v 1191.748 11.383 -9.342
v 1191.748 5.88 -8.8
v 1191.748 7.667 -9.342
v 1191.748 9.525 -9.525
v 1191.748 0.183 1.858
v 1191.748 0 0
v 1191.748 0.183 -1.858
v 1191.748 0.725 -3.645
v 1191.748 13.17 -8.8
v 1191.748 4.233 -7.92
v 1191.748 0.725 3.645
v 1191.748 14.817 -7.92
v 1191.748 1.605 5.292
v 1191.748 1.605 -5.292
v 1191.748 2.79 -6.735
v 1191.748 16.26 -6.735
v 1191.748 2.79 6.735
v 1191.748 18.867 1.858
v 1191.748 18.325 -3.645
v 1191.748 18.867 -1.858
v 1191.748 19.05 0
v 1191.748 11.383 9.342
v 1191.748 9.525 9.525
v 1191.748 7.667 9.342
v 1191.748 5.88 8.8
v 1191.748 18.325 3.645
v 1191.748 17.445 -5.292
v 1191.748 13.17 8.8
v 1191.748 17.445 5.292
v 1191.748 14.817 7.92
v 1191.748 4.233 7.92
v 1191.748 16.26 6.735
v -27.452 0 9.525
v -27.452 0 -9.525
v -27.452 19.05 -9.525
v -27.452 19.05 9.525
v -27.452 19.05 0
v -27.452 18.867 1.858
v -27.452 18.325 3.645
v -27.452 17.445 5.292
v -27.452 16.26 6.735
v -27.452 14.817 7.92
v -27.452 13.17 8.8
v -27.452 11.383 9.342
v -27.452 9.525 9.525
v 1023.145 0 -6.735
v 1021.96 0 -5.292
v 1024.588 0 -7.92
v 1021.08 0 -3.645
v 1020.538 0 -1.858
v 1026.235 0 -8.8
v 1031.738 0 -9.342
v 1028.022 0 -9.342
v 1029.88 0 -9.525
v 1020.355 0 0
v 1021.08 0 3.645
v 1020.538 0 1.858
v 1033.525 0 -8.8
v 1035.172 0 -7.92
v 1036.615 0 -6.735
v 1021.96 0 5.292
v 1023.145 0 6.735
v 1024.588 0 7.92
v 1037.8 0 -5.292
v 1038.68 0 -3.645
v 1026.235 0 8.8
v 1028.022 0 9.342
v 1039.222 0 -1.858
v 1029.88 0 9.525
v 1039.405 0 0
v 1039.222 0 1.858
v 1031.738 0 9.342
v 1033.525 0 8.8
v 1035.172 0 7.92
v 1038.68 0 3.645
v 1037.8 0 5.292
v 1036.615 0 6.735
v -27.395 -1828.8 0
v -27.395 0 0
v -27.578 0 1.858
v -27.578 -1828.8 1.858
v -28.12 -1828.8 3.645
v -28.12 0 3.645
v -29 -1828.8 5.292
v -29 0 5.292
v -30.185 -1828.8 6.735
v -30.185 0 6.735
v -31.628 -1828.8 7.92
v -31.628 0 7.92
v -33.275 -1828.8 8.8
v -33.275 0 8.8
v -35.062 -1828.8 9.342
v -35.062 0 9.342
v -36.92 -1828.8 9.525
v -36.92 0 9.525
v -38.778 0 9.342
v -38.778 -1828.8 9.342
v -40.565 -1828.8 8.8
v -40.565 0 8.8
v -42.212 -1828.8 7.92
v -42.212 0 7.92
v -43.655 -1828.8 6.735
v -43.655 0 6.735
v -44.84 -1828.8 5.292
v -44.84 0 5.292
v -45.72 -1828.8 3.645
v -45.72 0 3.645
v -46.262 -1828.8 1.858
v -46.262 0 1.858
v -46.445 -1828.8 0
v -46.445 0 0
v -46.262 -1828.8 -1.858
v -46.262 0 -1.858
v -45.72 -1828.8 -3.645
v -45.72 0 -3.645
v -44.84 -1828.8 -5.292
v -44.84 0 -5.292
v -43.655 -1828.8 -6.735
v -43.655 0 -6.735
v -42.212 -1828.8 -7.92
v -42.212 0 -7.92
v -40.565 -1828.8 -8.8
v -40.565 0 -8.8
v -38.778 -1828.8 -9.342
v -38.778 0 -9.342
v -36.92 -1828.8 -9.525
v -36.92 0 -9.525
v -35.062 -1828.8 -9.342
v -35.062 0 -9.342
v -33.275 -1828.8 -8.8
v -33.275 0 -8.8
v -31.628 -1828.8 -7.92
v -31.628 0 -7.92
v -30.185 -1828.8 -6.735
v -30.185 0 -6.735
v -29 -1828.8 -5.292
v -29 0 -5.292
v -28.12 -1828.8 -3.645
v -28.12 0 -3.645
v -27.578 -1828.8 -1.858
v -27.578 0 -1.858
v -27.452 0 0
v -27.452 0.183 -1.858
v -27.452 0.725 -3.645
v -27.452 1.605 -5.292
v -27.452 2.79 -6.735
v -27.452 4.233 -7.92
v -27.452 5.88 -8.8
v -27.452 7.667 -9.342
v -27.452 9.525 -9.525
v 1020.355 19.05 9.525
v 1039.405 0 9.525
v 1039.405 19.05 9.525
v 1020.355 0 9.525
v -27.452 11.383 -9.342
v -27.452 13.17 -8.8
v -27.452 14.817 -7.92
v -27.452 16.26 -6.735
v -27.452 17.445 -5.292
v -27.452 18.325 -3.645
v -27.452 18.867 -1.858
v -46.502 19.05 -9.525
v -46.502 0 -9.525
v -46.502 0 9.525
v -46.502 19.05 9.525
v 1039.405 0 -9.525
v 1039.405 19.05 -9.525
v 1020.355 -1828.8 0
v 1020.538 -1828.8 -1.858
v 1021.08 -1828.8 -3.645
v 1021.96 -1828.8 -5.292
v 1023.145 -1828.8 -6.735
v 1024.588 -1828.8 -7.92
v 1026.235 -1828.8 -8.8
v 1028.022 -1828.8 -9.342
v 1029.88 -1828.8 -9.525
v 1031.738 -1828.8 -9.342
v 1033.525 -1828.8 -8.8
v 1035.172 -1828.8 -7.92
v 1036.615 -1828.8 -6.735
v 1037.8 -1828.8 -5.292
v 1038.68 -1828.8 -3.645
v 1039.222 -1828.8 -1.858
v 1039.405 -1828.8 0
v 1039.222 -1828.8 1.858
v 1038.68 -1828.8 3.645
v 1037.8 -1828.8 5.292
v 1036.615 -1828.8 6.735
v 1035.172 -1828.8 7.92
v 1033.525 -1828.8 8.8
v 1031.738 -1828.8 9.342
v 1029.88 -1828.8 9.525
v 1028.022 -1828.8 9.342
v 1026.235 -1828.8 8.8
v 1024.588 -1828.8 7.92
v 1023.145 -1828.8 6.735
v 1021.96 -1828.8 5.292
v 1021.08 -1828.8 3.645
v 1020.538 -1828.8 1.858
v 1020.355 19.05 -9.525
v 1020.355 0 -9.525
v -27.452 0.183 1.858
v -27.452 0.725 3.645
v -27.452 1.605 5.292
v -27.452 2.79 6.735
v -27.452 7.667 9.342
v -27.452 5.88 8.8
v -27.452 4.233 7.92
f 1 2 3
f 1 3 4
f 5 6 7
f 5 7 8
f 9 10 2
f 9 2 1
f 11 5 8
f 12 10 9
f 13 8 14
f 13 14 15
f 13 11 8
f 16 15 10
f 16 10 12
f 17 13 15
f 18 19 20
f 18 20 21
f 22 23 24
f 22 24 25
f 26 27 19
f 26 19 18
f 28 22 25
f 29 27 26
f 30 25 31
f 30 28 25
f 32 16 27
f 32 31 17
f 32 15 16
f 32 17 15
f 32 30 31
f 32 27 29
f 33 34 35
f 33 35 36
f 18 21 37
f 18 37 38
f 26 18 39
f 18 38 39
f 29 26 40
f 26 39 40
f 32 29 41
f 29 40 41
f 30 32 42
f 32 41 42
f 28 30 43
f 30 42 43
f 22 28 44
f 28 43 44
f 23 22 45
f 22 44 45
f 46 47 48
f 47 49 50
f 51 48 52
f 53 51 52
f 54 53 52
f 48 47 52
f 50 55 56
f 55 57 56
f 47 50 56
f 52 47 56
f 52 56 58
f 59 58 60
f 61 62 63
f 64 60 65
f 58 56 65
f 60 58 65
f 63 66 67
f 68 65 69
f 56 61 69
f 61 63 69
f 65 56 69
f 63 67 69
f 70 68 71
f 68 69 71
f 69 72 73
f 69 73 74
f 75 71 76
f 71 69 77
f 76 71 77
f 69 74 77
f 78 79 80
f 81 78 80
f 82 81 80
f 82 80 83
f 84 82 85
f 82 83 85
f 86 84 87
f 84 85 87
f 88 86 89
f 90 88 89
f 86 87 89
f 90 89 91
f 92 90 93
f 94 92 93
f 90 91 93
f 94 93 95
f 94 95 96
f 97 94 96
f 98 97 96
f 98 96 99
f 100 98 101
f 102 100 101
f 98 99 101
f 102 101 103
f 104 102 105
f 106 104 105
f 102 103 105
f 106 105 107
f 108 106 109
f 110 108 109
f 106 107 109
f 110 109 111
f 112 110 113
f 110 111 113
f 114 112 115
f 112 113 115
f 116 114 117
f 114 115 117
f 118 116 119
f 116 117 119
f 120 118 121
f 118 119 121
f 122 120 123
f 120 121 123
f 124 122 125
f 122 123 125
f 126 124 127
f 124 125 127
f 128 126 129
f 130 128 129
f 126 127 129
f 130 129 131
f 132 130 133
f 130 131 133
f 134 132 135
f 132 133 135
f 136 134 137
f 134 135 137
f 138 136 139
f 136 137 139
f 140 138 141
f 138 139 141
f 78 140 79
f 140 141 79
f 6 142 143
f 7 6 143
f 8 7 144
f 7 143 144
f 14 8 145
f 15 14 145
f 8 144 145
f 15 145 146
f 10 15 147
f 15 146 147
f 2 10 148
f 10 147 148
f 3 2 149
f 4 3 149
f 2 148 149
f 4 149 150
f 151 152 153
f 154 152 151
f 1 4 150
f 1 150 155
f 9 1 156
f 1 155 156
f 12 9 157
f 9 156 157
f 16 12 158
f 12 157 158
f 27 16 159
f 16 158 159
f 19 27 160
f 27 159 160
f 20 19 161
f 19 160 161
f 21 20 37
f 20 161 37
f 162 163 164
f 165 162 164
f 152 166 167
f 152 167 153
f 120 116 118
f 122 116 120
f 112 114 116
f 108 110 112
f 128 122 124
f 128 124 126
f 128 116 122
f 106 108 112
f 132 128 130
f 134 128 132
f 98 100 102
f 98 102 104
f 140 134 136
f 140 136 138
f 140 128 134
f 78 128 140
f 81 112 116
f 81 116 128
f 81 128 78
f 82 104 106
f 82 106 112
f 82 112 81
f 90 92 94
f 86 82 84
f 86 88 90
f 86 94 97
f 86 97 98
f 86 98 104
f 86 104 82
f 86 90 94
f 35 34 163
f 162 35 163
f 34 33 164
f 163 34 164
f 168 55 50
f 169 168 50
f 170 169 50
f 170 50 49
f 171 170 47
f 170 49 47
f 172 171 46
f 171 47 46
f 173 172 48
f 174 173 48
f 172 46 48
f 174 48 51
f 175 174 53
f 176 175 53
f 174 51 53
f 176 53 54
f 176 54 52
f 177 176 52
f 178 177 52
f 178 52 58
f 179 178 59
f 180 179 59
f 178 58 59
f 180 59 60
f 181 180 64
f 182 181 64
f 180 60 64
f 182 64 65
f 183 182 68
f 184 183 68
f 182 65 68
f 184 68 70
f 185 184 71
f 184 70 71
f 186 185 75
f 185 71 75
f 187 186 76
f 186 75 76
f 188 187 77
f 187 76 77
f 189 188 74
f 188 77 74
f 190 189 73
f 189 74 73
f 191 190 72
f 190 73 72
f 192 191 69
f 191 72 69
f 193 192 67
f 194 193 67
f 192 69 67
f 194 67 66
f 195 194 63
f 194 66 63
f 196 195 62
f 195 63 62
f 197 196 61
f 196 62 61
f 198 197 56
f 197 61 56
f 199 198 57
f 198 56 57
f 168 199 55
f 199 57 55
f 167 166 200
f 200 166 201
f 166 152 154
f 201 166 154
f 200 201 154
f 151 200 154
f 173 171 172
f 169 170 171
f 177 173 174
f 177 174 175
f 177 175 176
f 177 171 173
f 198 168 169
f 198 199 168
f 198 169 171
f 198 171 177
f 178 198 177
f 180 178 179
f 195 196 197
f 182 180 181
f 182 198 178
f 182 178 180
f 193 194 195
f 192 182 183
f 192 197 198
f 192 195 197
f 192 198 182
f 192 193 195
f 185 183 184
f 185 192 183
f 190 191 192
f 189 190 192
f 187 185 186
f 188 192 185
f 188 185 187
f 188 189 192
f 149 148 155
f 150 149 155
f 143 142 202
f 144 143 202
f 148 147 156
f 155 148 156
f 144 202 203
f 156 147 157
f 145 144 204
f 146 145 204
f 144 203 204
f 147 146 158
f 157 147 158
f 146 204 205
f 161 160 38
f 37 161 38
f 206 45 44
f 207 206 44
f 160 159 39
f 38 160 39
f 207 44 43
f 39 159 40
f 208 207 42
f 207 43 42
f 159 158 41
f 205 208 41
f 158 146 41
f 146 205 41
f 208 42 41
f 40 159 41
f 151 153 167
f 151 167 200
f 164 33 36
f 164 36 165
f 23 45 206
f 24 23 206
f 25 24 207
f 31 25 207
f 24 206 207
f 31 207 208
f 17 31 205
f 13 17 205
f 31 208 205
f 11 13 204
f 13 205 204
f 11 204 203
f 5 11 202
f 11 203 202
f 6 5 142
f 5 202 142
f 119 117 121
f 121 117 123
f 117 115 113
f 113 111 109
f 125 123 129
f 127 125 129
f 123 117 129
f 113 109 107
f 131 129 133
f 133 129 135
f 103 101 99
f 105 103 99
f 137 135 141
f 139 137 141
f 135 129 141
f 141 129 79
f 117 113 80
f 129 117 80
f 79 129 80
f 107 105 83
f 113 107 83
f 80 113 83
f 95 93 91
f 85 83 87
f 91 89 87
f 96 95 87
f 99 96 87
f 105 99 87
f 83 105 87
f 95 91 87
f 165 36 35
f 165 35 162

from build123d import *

# Parameters (mm, degrees)
F0_R     = 9.525
F1_DEPTH = 1828.8
F2_W     = 19.05
F2_H     = 19.05
F3_DEPTH = 19.05
F5_DEPTH = 1219.2


with BuildPart() as f1:
    # F0 (on Front) → F1 (new body)
    with BuildSketch(Plane.XZ):
        with Locations((-36.919852, 0)):
            Circle(F0_R)
        with BuildLine():
            ThreePointArc((1039.405148, 0), (1029.880148, 9.525), (1020.355148, 0))
            ThreePointArc((1020.355148, 0), (1029.880148, -9.525), (1039.405148, 0))
        make_face()
    extrude(amount=F1_DEPTH)


with BuildPart() as f3:
    # F2 (on face) → F3 (new body)
    with BuildSketch(Plane(origin=(0, 0, 0), x_dir=(-1, 0, 0), z_dir=(0, 1, 0))):
        with Locations((-1029.880148, 0)):
            Rectangle(F2_W, F2_H)
        with Locations((36.977075, 0)):
            Rectangle(F2_W, F2_H)
    extrude(amount=F3_DEPTH)


with BuildPart() as f5:
    # F4 (on face) → F5 (new body)
    with BuildSketch(Plane.YZ.offset(-27.452075)):
        with BuildLine():
            ThreePointArc((9.525, -9.525), (16.260192, -6.735192), (19.05, 0))
            ThreePointArc((19.05, 0), (16.260192, 6.735192), (9.525, 9.525))
            ThreePointArc((9.525, 9.525), (2.789808, 6.735192), (0, 0))
            ThreePointArc((0, 0), (2.789808, -6.735192), (9.525, -9.525))
        make_face()
    extrude(amount=F5_DEPTH)


solid = Compound([f1.part, f3.part, f5.part])
